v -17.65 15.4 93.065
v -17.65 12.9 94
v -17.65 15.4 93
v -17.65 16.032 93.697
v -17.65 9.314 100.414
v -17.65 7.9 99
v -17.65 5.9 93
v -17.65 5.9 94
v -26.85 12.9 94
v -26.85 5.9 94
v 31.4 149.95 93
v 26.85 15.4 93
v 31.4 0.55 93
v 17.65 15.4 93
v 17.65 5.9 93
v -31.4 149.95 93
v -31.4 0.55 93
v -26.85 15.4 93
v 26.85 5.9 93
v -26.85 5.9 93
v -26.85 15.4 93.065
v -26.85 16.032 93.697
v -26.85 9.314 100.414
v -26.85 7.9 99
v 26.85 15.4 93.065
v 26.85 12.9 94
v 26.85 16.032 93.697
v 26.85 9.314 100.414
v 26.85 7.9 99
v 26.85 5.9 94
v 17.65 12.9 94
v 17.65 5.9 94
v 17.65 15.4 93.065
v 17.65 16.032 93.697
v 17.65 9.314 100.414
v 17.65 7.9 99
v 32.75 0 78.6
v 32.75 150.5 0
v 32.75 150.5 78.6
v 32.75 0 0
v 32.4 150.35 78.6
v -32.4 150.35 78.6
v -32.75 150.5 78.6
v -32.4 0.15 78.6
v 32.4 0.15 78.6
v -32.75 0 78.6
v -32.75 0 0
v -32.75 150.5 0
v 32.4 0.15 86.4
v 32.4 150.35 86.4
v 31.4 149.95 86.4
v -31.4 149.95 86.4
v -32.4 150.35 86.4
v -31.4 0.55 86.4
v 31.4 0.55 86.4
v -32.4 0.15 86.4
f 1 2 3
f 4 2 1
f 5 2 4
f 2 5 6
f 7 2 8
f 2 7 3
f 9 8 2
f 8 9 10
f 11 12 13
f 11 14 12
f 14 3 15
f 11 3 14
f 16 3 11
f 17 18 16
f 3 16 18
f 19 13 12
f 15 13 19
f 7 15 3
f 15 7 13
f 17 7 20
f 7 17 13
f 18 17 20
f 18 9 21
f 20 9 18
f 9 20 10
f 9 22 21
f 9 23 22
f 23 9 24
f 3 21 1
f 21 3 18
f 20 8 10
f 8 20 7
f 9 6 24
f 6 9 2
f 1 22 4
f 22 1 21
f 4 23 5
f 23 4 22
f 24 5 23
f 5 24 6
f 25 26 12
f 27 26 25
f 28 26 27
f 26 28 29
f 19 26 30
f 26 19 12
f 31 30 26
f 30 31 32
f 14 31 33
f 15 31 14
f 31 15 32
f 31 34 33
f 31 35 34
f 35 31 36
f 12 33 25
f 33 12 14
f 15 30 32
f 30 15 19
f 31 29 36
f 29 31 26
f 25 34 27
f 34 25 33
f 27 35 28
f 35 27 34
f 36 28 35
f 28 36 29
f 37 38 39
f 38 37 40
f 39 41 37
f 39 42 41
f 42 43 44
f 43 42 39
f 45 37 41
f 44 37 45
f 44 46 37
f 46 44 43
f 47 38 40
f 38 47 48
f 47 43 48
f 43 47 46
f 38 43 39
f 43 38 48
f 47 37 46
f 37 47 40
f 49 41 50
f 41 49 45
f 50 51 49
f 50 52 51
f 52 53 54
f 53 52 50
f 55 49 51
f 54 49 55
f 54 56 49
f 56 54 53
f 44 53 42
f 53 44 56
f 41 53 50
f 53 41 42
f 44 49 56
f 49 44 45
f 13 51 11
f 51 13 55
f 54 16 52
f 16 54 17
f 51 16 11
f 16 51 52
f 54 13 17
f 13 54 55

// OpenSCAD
// file: ../robot_settings.scad
main_box_x = 100; // 96
main_box_y = 102;
main_box_z = 74; // 74.5

lfp_main_box_x = 66;
lfp_main_box_y = 151;
lfp_main_box_z = 95;

wall_thickness = 2;

rail_gap = 2;
rail_inset = 7;

rail_thickness = 7;
rail_length = 250;
rail_width = 290;

lfp_battery_width = 65.5;
lfp_battery_depth = 150.5;
lfp_battery_height = 93;
lfp_battery_midterrace_width = 64.8;
lfp_battery_midterrace_depth = 150.2;
lfp_battery_midterrace_height = 7.8;
lfp_battery_topterrace_width = 62.8;
lfp_battery_topterrace_depth = 149.4;
lfp_battery_topterrace_height = 6.6;

// red right
// black left
lfp_battery_terminal_width = 9.2;
lfp_battery_terminal_depth = 9.5;
lfp_battery_terminal_depth_setback = 14.4;
lfp_battery_terminal_width_setback = 5.9;

raspberry_pi_screw_seperation_y = 57;
raspberry_pi_screw_seperation_z = 48;
raspberry_pi_peg_h = 5;

battery_box_peg_h = 6;
battery_box_peg_d = 8;
battery_box_peg_cutout = 5;

gears_module = 1;
pinion_gear_teeth = 32;
pinion_gear_width = 5;
pinion_gear_bore = 8;

gears_setback_distance = 25;
gear_post_height = 2 * pinion_gear_width + rail_thickness + 8 ;

steering_motor_mount_x = 45;
steering_motor_mount_y = 36;
steering_motor_mount_z = 18;
steering_motor_mount_setback_distance = gears_setback_distance + 16;

dc_motor_drivertype = "Teyleten"; // Teyleten
isAdafruit = (dc_motor_drivertype == "Adafruit");

drv8871_x = isAdafruit ? 20.3 : 21.6;
drv8871_y = isAdafruit ?  24 : 25;

drv8871_z = 2;
drv8871_screw_d = 2.5;
drv8871_solder_points_z = 2;

drv8871mount_edge_x = 1.5;
drv8871mount_edge_wall = 3;
drv8871mount_z = 5;
drv8871mount_x = drv8871_x +  drv8871mount_edge_wall - 2* drv8871mount_edge_x;
drv8871mount_y = 19;

drv8871_screw_distance = 15.64;
drv8871_solder_points_d = 1.66;
drv8871_solder_offset_y = 4.4;
drv8871_solder_inner_points_distance = 5;
drv8871_solder_outer_points_distance = 12;

dc_motor_75_1_encoder_z = 14.75;
dc_motor_75_1_encoder_d = 24.5;
dc_motor_75_1_housing_z = 30;
dc_motor_75_1_housing_d = 24.1;
dc_motor_75_1_gearbox_z = 23;
dc_motor_75_1_gearbox_d = 24.8;
dc_motor_75_1_z = dc_motor_75_1_encoder_z + dc_motor_75_1_housing_z + dc_motor_75_1_gearbox_z;

dc_motor_housing_minus_encoder_z = 48;
dc_motor_encoder_z = 9.33;
dc_motor_encoder_wheel_d = 13.4;
dc_motor_encoder_wheel_thickness = 5;
dc_motor_encoder_wheel_gap = 3;
dc_motor_encoder_circuit_thickness = 2;
dc_motor_cutout_d = 24.8;
dc_motor_cutout_z = 19.5;


M3_shaft_d = 2.82;

dc_motor_screw_head_z = 2;
dc_motor_screw_head_d = 5.6;
dc_motor_screw_d = 3.2;
dc_motor_screw_offset = 8.5;

dc_motor_axle_ring_z = 3;
dc_motor_axle_ring_d = 7.2;
dc_motor_axle_cutout_d = 4.2;
dc_motor_axle_cutout_z = 10;
dc_motor_axle_notch_cutout = 0.4;
dc_motor_axle_notch_cutout_z = 6;

pdmount_x = 20;
pdmount_y = 30;
pdmount_z = 2;
pdmount_edge_x = 1.5;
pdmount_edge_wall = 3;

steering_shaft_z = 45;
steering_shaft_d = 7;
steering_shaft_motor_fitting_d = 9;
coupler_length = 24.6;
coupler_diameter = 14;
coupler_screw_d = 4;
coupler_screw_z_offset = 5;
coupler_gear_side_insert = 12.6;
steering_shaft_with_coupler_z = steering_shaft_z - coupler_gear_side_insert;

lidar_mount_y = 110;
lidar_mount_x = 65 + 20;
lidar_narrow_screws = 40;
lidar_wide_screws = 56;
lidar_front_to_back_screws = 70;
lidar_screw_d = 3;
lidar_circuitboard_x = 20;
lidar_circuitboard_y = 35;
lidar_circuitboard_z = 1.2;
lidar_cord_length = 29;

ball_bearing_height = 7;
ball_bearing_outer_diameter = 22;
ball_bearing_inner_diameter = 8;

M4_diameter = 5.1;
M3_diameter = 2.9;
M3_length = 35;
M3_cap_length= 3;
M3_cap_diameter = 5.44;

suspension_spring_outer_diameter = 8;
suspension_spring_inner_diameter = 5.3;

armature_holder_height = 20;
armature_holder_thickness = 8;
pull_bar_peg_r = 3.2;
apparatus_locking_peg_d = 4;

rack_module = 1;
rack_length = main_box_x;
rack_height = 5;
rack_width = 10;
rack_teeth = 30;
rack_bore = 3;

pull_bar_length = rail_width / 2 - rack_length + 1;

// tire hardware
axle_length = 24 + ball_bearing_height; 
axle_reciever_inner_diameter = 8.2;
axle_reciever_outer_diameter = 12;
axle_reciever_length = 18.8;
axle_notch_length = 15;
axle_notch_cutout = 2.4;

// power distribution bar
power_bar_cutout_x = 96;
power_bar_y = 19.1;
power_bar_z = 1.5;
power_bar_screw_distance = 91.4;
power_bar_screw_d = 2.8;
power_bar_standoff_z = 5;
power_bar_standoff_d = 6.83;

pico_expander_width = 63;
pico_expander_height = 57;
pico_screw_hole_offset = 3;
pico_screw_hole_d = 2.5;

usbhub_thickness = 11.7;
usbhub_depth = 37.5;
usbhub_width = 86.7;
usbhub_end_port_width = 14.8;
usbhub_end_port_height = 12;
usbhub_front_face_safe_zone_left = 15;
usbhub_front_face_safe_zone_right = 14.8;

switch_w = 16;
switch_cutout_d = 12.2;
switch_bump_h = 2;
switch_bump_l = 18.2;

i2c_mount_thickness = 3;
i2c_w = 28;
i2c_l = 28;
i2c_circuitboard_thickness = 1.23;
i2c_bottom_notch_w = 14.35;
i2c_bottom_notch_depth = 1;
i2c_screw_hole_d = 1.9;
i2c_screw_hole_offset = 1.4;
i2c_pin_l = 11;
i2c_pin_d = 0.8;
i2c_pin_offset = 1.5;
i2c_pin_separation = 2.5;
i2c_all_pins_l = 8.3;
i2c_screen_thickness = 1.88;
i2c_screen_w = 14.6;
i2c_screen_d = 27;
i2c_screen_offset = 4.1;
// main file
include <../robot_settings.scad>

module lfp_battery() {
    hm =  lfp_battery_height - lfp_battery_midterrace_height - lfp_battery_topterrace_height;

    // main body
    translate([-lfp_battery_width / 2, 0, 0])
    cube([lfp_battery_width, lfp_battery_depth, hm]);

    // mid terrice
    diffmw = (lfp_battery_width - lfp_battery_midterrace_width)/2;
    diffmd = (lfp_battery_depth - lfp_battery_midterrace_depth)/2;

    translate([-lfp_battery_width / 2 + diffmw, diffmd, hm])
    color("green")
    cube([lfp_battery_midterrace_width, lfp_battery_midterrace_depth, lfp_battery_midterrace_height]);

    // top terrace
    ht = hm + lfp_battery_midterrace_height;

    difftw = (lfp_battery_width - lfp_battery_topterrace_width)/2;
    difftd = (lfp_battery_depth - lfp_battery_topterrace_depth)/2;

    translate([-lfp_battery_width / 2 + difftw, difftd, ht])
    color("yellow")
    cube([lfp_battery_topterrace_width, lfp_battery_topterrace_depth, lfp_battery_topterrace_height]);
    
    // terminals
    hterm = ht + lfp_battery_topterrace_height;
    leftterm = -lfp_battery_width / 2 + lfp_battery_terminal_width_setback;
    rightterm = lfp_battery_width / 2 - lfp_battery_terminal_width - lfp_battery_terminal_width_setback;
    
    translate([leftterm, lfp_battery_terminal_width_setback, hterm]) {
      color("red")
      cube([lfp_battery_terminal_width, lfp_battery_terminal_depth, 1]);
      translate([0, 2, 6])
      rotate([-45, 0, 0])
      color("gold")
      cube([lfp_battery_terminal_width, lfp_battery_terminal_depth, 2]);
    }
    
    translate([rightterm, lfp_battery_terminal_width_setback, hterm]) {
     color("black")
     cube([lfp_battery_terminal_width, lfp_battery_terminal_depth, 1]);
      translate([0, 2, 6])
      rotate([-45, 0, 0])
      color("gold")
      cube([lfp_battery_terminal_width, lfp_battery_terminal_depth, 2]);
   }    
}
lfp_battery();
